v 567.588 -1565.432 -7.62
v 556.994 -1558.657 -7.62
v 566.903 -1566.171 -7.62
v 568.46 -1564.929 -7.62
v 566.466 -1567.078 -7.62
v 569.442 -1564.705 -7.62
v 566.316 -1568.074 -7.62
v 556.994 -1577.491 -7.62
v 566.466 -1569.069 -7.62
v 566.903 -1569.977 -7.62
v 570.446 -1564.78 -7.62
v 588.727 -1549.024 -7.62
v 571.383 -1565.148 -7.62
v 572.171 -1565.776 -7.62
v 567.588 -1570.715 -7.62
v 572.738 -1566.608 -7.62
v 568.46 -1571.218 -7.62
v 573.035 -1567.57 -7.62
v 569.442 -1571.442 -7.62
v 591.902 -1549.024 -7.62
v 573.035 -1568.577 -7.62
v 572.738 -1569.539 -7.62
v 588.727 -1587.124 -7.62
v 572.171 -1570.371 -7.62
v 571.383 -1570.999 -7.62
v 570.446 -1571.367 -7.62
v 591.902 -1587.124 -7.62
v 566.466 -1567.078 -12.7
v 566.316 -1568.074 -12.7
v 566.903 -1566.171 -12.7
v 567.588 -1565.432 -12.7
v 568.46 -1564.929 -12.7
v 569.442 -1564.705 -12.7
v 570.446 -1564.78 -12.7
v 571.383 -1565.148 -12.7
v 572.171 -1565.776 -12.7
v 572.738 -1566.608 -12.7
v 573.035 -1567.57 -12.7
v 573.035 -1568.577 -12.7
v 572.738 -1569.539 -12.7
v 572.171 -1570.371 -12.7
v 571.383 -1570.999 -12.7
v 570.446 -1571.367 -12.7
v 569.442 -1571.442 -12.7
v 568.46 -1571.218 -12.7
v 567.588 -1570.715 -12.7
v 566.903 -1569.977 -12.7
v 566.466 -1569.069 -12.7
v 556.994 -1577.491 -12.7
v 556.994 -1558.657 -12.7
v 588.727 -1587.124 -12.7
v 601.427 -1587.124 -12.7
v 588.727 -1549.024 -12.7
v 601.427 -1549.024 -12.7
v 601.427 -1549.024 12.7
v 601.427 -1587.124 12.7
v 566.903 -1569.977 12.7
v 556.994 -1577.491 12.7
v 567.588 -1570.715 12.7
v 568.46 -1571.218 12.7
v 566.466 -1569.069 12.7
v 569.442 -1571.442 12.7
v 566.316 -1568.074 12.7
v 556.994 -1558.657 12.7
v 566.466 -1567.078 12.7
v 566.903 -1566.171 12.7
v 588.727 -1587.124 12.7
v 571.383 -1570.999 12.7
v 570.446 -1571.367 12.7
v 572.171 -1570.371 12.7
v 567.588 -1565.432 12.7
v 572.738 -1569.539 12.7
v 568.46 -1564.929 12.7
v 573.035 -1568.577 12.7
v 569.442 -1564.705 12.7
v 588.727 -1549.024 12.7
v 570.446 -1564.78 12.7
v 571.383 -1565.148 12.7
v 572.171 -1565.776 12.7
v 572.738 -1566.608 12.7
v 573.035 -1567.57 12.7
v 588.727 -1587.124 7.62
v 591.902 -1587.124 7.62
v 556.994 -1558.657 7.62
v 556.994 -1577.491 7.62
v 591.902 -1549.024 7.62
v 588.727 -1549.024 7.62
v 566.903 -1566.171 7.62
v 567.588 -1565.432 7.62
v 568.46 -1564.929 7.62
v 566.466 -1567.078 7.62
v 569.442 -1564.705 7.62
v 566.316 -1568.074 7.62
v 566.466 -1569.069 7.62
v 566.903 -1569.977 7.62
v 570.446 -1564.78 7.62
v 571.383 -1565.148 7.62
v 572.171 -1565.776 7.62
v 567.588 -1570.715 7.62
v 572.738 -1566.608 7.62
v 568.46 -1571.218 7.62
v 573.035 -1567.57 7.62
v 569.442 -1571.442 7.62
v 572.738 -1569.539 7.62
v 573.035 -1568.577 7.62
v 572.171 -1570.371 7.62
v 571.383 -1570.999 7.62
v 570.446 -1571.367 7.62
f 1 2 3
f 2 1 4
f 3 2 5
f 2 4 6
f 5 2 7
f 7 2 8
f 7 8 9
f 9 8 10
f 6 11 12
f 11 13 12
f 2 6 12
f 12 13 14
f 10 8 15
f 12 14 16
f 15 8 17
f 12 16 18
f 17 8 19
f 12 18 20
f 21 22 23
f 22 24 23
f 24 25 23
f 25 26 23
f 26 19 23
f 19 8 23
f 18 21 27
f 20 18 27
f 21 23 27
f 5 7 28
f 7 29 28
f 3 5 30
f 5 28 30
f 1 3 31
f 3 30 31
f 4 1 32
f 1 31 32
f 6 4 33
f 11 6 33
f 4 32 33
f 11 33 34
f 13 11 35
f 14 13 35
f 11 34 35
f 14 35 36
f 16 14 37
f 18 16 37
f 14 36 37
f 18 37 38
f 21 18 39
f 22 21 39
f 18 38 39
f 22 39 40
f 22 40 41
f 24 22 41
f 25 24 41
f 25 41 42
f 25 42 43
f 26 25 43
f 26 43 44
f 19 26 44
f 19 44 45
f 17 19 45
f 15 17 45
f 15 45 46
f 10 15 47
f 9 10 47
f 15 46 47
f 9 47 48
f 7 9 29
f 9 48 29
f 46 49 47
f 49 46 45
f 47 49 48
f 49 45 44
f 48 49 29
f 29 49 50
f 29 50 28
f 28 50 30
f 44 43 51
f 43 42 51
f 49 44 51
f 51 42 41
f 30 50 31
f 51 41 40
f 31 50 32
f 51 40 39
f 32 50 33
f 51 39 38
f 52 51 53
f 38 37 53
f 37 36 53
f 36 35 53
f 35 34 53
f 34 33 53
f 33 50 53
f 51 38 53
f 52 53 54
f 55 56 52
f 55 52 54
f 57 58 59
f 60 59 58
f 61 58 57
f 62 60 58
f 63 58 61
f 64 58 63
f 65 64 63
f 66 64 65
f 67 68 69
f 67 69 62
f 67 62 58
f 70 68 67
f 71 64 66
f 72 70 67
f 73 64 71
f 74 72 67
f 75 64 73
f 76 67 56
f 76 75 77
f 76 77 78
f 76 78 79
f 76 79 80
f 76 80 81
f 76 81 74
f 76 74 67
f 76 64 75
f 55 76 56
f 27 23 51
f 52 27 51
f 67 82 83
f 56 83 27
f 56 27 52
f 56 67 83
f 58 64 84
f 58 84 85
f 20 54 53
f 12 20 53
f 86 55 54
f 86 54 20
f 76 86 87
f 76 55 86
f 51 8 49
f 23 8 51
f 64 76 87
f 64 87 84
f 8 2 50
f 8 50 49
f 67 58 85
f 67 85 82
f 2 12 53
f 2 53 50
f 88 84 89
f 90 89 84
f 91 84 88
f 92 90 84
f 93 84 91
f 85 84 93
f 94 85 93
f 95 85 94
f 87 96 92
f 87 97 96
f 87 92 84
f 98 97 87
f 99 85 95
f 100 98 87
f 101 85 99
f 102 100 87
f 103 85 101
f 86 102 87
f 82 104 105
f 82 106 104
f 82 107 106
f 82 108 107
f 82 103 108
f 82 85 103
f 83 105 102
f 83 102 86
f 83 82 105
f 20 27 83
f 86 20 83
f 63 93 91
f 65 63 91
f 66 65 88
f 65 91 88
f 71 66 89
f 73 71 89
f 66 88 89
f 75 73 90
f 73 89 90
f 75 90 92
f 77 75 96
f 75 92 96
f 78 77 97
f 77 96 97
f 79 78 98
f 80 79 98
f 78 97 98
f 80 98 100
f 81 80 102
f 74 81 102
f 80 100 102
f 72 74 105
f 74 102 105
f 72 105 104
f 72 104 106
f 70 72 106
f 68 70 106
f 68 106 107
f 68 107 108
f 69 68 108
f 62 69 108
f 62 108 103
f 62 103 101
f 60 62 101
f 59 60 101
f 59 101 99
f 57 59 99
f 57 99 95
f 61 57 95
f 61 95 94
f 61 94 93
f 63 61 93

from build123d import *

# Parameters (mm, degrees)
BOSS_EXTRUDE1_DEPTH         = 12.7
BOSS_EXTRUDE1_DEPTH_BACK    = 12.7
SKETCH2_W                   = 34.908195051
SKETCH2_H                   = 15.24
CUT_EXTRUDE1_DEPTH          = 38.1
F_1_4_CLEARANCE_HOLE1_D     = 6.7564
F_1_4_CLEARANCE_HOLE1_DEPTH = 25.4
F_1_4_CLEARANCE_HOLE1_TIP   = 2.029827343


with BuildPart() as part:
    # Sketch1 → Boss-Extrude1 (new body, two sides)
    with BuildSketch(Plane.XY) as boss_extrude1_sk:
        Polygon((556.99412228, -1558.656635977), (556.99412228, -1577.490689714), (588.727317331, -1587.123662845), (601.427317331, -1587.123662845), (601.427317331, -1549.023662845), (588.727317331, -1549.023662845), align=None)
    extrude(amount=BOSS_EXTRUDE1_DEPTH)
    extrude(boss_extrude1_sk.sketch, amount=-BOSS_EXTRUDE1_DEPTH_BACK)

    # Sketch2 → Cut-Extrude1 (cut)
    with BuildSketch(Plane.XZ.offset(1587.123662845)):
        with Locations((574.448219806, 0)):
            Rectangle(SKETCH2_W, SKETCH2_H)
    extrude(amount=-CUT_EXTRUDE1_DEPTH, mode=Mode.SUBTRACT)

    # 1/4 Clearance Hole1
    with Locations(Plane.XY.offset(12.7)):
        with Locations((569.69412228, -1568.073662845)):
            Hole(F_1_4_CLEARANCE_HOLE1_D / 2, depth=F_1_4_CLEARANCE_HOLE1_DEPTH)
            with Locations((0, 0, -(F_1_4_CLEARANCE_HOLE1_DEPTH + F_1_4_CLEARANCE_HOLE1_TIP / 2))):  # 118° drill point
                Cone(0, F_1_4_CLEARANCE_HOLE1_D / 2, F_1_4_CLEARANCE_HOLE1_TIP, mode=Mode.SUBTRACT)


solid = part.part
